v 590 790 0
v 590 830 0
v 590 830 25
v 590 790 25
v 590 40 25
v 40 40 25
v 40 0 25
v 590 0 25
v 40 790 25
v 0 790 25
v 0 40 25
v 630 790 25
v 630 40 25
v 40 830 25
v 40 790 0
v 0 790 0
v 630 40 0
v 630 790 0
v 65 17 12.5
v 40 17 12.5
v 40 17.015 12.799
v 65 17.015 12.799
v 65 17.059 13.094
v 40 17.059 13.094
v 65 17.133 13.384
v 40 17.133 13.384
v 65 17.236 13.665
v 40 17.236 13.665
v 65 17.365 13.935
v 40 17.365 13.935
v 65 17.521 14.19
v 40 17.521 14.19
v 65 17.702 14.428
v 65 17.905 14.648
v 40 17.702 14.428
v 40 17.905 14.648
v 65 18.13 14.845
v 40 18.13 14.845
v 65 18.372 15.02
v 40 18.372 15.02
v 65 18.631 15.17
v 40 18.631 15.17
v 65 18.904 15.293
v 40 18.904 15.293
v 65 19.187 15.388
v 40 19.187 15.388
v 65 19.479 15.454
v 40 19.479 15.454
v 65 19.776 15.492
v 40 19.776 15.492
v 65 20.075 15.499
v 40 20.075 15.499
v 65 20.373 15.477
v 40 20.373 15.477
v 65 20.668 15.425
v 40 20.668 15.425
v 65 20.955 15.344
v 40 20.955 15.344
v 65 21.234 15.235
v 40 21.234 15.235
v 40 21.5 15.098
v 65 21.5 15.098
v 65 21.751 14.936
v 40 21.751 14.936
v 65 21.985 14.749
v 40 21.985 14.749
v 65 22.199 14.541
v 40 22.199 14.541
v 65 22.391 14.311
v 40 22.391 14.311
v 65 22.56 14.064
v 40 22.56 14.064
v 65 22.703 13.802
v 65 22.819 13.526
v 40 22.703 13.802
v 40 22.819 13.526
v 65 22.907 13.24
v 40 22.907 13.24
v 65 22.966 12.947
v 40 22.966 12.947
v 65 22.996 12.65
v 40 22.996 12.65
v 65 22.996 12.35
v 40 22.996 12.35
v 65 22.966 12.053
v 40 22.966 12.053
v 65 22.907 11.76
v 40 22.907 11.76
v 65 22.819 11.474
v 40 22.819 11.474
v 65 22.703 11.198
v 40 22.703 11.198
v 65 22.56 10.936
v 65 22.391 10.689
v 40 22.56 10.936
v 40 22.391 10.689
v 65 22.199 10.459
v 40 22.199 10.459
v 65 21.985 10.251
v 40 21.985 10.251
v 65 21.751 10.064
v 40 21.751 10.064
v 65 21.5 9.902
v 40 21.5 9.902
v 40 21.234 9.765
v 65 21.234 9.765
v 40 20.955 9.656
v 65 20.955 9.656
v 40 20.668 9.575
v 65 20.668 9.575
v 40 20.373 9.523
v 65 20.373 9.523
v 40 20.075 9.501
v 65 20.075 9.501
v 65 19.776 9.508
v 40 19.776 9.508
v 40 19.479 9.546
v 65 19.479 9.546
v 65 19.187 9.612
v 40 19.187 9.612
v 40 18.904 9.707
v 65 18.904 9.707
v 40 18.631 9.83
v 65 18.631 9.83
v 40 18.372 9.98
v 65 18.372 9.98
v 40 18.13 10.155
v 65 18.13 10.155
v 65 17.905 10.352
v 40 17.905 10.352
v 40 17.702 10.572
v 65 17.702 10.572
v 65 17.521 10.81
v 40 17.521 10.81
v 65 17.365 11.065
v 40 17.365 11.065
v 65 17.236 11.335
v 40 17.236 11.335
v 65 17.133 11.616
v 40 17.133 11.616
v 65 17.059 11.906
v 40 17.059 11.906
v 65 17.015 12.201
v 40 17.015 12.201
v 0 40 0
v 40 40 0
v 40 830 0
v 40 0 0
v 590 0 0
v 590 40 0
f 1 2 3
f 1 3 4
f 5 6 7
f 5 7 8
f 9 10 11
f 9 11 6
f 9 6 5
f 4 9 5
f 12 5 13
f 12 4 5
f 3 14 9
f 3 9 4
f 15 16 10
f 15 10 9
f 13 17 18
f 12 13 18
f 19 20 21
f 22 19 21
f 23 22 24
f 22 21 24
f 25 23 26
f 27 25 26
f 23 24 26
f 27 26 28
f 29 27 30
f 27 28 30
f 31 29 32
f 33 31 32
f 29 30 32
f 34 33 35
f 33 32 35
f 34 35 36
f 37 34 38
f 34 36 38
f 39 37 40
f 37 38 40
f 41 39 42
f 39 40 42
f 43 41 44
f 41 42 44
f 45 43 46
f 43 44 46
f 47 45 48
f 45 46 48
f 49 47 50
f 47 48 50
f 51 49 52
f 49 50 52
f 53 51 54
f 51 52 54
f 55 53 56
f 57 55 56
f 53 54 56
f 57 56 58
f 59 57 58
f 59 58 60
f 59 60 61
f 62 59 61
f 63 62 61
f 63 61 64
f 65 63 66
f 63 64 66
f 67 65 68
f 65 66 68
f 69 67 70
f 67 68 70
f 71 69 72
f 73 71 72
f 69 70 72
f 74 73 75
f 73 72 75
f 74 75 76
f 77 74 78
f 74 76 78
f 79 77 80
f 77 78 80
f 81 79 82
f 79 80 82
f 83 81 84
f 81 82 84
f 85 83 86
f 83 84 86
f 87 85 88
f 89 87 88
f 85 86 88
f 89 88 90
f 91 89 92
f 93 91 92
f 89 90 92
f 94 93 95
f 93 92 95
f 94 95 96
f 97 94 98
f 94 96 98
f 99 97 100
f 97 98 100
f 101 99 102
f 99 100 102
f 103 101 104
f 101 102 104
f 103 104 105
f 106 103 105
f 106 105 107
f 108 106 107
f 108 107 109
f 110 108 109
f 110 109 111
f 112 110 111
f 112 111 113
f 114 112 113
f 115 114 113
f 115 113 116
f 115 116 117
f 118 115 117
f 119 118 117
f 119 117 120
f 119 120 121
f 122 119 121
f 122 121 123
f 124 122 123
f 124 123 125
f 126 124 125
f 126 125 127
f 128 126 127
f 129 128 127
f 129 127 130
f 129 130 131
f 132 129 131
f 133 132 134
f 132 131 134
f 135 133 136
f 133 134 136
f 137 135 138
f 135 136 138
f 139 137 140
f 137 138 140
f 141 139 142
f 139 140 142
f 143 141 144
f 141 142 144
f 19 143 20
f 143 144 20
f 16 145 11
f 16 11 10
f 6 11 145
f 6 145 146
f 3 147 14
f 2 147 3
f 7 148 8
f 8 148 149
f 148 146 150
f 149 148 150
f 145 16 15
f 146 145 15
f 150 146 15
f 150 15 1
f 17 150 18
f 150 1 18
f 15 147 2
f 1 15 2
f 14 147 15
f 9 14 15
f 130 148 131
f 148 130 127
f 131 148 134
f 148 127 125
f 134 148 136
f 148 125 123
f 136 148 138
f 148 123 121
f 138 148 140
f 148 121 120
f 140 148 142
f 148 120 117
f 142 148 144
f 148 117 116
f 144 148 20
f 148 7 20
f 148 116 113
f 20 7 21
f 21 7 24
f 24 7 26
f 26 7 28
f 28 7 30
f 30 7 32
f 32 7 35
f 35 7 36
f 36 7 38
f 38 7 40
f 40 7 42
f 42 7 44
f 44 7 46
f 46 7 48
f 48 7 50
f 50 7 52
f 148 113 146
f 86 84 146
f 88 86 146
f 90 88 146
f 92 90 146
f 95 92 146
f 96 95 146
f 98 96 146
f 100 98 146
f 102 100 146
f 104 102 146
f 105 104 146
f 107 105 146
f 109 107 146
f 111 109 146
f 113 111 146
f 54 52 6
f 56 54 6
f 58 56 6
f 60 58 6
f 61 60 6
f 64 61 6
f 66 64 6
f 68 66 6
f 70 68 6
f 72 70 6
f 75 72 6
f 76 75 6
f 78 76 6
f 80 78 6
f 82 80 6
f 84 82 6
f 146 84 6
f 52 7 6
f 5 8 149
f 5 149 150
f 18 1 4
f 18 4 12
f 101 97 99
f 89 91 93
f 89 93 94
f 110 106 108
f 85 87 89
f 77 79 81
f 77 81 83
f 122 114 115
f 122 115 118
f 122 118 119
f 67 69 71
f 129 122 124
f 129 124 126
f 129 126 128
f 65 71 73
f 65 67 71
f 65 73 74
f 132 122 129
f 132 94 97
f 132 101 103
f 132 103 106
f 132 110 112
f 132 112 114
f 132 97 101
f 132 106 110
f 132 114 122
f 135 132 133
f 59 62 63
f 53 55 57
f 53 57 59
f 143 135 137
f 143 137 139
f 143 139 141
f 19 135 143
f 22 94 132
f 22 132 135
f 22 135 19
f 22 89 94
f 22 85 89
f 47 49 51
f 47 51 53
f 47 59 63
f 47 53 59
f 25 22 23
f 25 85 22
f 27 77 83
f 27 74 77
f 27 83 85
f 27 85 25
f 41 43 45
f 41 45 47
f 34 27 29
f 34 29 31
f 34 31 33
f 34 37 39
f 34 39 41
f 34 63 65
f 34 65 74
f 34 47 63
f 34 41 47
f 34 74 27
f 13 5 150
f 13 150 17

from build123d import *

# Parameters (mm, degrees)
F0_W      = 630
F0_H      = 830
F1_DEPTH  = 25
F2_W      = 40
F2_H      = 40
F3_DEPTH  = 25
F4_W      = 40
F4_H      = 40
F5_DEPTH  = 25
F6_W      = 40
F6_H      = 40
F7_DEPTH  = 25
F8_W      = 40
F8_H      = 40
F9_DEPTH  = 25
F10_R     = 3
F11_DEPTH = 25


with BuildPart() as f1:
    # F0 (on Top) → F1 (new body)
    with BuildSketch(Plane.XY):
        with Locations((315, 415)):
            Rectangle(F0_W, F0_H)
    extrude(amount=F1_DEPTH)

    # F2 (on face) → F3 (cut)
    with BuildSketch(Plane.XY.offset(25)):
        with Locations((610, 20)):
            Rectangle(F2_W, F2_H)
    extrude(amount=-F3_DEPTH, mode=Mode.SUBTRACT)

    # F4 (on face) → F5 (cut)
    with BuildSketch(Plane.XY.offset(25)):
        with Locations((20, 20)):
            Rectangle(F4_W, F4_H)
    extrude(amount=-F5_DEPTH, mode=Mode.SUBTRACT)

    # F6 (on face) → F7 (cut)
    with BuildSketch(Plane(origin=(0, 0, 0), x_dir=(1, 0, 0), z_dir=(0, 0, -1))):
        with Locations((20, -810)):
            Rectangle(F6_W, F6_H)
    extrude(amount=-F7_DEPTH, mode=Mode.SUBTRACT)

    # F8 (on face) → F9 (cut)
    with BuildSketch(Plane(origin=(0, 0, 0), x_dir=(1, 0, 0), z_dir=(0, 0, -1))):
        with Locations((610, -810)):
            Rectangle(F8_W, F8_H)
    extrude(amount=-F9_DEPTH, mode=Mode.SUBTRACT)

    # F10 (on face) → F11 (cut)
    with BuildSketch(Plane(origin=(40, 0, 0), x_dir=(0, -1, 0), z_dir=(-1, 0, 0))):
        with Locations((-20, 12.5)):
            Circle(F10_R)
    extrude(amount=-F11_DEPTH, mode=Mode.SUBTRACT)


solid = f1.part
